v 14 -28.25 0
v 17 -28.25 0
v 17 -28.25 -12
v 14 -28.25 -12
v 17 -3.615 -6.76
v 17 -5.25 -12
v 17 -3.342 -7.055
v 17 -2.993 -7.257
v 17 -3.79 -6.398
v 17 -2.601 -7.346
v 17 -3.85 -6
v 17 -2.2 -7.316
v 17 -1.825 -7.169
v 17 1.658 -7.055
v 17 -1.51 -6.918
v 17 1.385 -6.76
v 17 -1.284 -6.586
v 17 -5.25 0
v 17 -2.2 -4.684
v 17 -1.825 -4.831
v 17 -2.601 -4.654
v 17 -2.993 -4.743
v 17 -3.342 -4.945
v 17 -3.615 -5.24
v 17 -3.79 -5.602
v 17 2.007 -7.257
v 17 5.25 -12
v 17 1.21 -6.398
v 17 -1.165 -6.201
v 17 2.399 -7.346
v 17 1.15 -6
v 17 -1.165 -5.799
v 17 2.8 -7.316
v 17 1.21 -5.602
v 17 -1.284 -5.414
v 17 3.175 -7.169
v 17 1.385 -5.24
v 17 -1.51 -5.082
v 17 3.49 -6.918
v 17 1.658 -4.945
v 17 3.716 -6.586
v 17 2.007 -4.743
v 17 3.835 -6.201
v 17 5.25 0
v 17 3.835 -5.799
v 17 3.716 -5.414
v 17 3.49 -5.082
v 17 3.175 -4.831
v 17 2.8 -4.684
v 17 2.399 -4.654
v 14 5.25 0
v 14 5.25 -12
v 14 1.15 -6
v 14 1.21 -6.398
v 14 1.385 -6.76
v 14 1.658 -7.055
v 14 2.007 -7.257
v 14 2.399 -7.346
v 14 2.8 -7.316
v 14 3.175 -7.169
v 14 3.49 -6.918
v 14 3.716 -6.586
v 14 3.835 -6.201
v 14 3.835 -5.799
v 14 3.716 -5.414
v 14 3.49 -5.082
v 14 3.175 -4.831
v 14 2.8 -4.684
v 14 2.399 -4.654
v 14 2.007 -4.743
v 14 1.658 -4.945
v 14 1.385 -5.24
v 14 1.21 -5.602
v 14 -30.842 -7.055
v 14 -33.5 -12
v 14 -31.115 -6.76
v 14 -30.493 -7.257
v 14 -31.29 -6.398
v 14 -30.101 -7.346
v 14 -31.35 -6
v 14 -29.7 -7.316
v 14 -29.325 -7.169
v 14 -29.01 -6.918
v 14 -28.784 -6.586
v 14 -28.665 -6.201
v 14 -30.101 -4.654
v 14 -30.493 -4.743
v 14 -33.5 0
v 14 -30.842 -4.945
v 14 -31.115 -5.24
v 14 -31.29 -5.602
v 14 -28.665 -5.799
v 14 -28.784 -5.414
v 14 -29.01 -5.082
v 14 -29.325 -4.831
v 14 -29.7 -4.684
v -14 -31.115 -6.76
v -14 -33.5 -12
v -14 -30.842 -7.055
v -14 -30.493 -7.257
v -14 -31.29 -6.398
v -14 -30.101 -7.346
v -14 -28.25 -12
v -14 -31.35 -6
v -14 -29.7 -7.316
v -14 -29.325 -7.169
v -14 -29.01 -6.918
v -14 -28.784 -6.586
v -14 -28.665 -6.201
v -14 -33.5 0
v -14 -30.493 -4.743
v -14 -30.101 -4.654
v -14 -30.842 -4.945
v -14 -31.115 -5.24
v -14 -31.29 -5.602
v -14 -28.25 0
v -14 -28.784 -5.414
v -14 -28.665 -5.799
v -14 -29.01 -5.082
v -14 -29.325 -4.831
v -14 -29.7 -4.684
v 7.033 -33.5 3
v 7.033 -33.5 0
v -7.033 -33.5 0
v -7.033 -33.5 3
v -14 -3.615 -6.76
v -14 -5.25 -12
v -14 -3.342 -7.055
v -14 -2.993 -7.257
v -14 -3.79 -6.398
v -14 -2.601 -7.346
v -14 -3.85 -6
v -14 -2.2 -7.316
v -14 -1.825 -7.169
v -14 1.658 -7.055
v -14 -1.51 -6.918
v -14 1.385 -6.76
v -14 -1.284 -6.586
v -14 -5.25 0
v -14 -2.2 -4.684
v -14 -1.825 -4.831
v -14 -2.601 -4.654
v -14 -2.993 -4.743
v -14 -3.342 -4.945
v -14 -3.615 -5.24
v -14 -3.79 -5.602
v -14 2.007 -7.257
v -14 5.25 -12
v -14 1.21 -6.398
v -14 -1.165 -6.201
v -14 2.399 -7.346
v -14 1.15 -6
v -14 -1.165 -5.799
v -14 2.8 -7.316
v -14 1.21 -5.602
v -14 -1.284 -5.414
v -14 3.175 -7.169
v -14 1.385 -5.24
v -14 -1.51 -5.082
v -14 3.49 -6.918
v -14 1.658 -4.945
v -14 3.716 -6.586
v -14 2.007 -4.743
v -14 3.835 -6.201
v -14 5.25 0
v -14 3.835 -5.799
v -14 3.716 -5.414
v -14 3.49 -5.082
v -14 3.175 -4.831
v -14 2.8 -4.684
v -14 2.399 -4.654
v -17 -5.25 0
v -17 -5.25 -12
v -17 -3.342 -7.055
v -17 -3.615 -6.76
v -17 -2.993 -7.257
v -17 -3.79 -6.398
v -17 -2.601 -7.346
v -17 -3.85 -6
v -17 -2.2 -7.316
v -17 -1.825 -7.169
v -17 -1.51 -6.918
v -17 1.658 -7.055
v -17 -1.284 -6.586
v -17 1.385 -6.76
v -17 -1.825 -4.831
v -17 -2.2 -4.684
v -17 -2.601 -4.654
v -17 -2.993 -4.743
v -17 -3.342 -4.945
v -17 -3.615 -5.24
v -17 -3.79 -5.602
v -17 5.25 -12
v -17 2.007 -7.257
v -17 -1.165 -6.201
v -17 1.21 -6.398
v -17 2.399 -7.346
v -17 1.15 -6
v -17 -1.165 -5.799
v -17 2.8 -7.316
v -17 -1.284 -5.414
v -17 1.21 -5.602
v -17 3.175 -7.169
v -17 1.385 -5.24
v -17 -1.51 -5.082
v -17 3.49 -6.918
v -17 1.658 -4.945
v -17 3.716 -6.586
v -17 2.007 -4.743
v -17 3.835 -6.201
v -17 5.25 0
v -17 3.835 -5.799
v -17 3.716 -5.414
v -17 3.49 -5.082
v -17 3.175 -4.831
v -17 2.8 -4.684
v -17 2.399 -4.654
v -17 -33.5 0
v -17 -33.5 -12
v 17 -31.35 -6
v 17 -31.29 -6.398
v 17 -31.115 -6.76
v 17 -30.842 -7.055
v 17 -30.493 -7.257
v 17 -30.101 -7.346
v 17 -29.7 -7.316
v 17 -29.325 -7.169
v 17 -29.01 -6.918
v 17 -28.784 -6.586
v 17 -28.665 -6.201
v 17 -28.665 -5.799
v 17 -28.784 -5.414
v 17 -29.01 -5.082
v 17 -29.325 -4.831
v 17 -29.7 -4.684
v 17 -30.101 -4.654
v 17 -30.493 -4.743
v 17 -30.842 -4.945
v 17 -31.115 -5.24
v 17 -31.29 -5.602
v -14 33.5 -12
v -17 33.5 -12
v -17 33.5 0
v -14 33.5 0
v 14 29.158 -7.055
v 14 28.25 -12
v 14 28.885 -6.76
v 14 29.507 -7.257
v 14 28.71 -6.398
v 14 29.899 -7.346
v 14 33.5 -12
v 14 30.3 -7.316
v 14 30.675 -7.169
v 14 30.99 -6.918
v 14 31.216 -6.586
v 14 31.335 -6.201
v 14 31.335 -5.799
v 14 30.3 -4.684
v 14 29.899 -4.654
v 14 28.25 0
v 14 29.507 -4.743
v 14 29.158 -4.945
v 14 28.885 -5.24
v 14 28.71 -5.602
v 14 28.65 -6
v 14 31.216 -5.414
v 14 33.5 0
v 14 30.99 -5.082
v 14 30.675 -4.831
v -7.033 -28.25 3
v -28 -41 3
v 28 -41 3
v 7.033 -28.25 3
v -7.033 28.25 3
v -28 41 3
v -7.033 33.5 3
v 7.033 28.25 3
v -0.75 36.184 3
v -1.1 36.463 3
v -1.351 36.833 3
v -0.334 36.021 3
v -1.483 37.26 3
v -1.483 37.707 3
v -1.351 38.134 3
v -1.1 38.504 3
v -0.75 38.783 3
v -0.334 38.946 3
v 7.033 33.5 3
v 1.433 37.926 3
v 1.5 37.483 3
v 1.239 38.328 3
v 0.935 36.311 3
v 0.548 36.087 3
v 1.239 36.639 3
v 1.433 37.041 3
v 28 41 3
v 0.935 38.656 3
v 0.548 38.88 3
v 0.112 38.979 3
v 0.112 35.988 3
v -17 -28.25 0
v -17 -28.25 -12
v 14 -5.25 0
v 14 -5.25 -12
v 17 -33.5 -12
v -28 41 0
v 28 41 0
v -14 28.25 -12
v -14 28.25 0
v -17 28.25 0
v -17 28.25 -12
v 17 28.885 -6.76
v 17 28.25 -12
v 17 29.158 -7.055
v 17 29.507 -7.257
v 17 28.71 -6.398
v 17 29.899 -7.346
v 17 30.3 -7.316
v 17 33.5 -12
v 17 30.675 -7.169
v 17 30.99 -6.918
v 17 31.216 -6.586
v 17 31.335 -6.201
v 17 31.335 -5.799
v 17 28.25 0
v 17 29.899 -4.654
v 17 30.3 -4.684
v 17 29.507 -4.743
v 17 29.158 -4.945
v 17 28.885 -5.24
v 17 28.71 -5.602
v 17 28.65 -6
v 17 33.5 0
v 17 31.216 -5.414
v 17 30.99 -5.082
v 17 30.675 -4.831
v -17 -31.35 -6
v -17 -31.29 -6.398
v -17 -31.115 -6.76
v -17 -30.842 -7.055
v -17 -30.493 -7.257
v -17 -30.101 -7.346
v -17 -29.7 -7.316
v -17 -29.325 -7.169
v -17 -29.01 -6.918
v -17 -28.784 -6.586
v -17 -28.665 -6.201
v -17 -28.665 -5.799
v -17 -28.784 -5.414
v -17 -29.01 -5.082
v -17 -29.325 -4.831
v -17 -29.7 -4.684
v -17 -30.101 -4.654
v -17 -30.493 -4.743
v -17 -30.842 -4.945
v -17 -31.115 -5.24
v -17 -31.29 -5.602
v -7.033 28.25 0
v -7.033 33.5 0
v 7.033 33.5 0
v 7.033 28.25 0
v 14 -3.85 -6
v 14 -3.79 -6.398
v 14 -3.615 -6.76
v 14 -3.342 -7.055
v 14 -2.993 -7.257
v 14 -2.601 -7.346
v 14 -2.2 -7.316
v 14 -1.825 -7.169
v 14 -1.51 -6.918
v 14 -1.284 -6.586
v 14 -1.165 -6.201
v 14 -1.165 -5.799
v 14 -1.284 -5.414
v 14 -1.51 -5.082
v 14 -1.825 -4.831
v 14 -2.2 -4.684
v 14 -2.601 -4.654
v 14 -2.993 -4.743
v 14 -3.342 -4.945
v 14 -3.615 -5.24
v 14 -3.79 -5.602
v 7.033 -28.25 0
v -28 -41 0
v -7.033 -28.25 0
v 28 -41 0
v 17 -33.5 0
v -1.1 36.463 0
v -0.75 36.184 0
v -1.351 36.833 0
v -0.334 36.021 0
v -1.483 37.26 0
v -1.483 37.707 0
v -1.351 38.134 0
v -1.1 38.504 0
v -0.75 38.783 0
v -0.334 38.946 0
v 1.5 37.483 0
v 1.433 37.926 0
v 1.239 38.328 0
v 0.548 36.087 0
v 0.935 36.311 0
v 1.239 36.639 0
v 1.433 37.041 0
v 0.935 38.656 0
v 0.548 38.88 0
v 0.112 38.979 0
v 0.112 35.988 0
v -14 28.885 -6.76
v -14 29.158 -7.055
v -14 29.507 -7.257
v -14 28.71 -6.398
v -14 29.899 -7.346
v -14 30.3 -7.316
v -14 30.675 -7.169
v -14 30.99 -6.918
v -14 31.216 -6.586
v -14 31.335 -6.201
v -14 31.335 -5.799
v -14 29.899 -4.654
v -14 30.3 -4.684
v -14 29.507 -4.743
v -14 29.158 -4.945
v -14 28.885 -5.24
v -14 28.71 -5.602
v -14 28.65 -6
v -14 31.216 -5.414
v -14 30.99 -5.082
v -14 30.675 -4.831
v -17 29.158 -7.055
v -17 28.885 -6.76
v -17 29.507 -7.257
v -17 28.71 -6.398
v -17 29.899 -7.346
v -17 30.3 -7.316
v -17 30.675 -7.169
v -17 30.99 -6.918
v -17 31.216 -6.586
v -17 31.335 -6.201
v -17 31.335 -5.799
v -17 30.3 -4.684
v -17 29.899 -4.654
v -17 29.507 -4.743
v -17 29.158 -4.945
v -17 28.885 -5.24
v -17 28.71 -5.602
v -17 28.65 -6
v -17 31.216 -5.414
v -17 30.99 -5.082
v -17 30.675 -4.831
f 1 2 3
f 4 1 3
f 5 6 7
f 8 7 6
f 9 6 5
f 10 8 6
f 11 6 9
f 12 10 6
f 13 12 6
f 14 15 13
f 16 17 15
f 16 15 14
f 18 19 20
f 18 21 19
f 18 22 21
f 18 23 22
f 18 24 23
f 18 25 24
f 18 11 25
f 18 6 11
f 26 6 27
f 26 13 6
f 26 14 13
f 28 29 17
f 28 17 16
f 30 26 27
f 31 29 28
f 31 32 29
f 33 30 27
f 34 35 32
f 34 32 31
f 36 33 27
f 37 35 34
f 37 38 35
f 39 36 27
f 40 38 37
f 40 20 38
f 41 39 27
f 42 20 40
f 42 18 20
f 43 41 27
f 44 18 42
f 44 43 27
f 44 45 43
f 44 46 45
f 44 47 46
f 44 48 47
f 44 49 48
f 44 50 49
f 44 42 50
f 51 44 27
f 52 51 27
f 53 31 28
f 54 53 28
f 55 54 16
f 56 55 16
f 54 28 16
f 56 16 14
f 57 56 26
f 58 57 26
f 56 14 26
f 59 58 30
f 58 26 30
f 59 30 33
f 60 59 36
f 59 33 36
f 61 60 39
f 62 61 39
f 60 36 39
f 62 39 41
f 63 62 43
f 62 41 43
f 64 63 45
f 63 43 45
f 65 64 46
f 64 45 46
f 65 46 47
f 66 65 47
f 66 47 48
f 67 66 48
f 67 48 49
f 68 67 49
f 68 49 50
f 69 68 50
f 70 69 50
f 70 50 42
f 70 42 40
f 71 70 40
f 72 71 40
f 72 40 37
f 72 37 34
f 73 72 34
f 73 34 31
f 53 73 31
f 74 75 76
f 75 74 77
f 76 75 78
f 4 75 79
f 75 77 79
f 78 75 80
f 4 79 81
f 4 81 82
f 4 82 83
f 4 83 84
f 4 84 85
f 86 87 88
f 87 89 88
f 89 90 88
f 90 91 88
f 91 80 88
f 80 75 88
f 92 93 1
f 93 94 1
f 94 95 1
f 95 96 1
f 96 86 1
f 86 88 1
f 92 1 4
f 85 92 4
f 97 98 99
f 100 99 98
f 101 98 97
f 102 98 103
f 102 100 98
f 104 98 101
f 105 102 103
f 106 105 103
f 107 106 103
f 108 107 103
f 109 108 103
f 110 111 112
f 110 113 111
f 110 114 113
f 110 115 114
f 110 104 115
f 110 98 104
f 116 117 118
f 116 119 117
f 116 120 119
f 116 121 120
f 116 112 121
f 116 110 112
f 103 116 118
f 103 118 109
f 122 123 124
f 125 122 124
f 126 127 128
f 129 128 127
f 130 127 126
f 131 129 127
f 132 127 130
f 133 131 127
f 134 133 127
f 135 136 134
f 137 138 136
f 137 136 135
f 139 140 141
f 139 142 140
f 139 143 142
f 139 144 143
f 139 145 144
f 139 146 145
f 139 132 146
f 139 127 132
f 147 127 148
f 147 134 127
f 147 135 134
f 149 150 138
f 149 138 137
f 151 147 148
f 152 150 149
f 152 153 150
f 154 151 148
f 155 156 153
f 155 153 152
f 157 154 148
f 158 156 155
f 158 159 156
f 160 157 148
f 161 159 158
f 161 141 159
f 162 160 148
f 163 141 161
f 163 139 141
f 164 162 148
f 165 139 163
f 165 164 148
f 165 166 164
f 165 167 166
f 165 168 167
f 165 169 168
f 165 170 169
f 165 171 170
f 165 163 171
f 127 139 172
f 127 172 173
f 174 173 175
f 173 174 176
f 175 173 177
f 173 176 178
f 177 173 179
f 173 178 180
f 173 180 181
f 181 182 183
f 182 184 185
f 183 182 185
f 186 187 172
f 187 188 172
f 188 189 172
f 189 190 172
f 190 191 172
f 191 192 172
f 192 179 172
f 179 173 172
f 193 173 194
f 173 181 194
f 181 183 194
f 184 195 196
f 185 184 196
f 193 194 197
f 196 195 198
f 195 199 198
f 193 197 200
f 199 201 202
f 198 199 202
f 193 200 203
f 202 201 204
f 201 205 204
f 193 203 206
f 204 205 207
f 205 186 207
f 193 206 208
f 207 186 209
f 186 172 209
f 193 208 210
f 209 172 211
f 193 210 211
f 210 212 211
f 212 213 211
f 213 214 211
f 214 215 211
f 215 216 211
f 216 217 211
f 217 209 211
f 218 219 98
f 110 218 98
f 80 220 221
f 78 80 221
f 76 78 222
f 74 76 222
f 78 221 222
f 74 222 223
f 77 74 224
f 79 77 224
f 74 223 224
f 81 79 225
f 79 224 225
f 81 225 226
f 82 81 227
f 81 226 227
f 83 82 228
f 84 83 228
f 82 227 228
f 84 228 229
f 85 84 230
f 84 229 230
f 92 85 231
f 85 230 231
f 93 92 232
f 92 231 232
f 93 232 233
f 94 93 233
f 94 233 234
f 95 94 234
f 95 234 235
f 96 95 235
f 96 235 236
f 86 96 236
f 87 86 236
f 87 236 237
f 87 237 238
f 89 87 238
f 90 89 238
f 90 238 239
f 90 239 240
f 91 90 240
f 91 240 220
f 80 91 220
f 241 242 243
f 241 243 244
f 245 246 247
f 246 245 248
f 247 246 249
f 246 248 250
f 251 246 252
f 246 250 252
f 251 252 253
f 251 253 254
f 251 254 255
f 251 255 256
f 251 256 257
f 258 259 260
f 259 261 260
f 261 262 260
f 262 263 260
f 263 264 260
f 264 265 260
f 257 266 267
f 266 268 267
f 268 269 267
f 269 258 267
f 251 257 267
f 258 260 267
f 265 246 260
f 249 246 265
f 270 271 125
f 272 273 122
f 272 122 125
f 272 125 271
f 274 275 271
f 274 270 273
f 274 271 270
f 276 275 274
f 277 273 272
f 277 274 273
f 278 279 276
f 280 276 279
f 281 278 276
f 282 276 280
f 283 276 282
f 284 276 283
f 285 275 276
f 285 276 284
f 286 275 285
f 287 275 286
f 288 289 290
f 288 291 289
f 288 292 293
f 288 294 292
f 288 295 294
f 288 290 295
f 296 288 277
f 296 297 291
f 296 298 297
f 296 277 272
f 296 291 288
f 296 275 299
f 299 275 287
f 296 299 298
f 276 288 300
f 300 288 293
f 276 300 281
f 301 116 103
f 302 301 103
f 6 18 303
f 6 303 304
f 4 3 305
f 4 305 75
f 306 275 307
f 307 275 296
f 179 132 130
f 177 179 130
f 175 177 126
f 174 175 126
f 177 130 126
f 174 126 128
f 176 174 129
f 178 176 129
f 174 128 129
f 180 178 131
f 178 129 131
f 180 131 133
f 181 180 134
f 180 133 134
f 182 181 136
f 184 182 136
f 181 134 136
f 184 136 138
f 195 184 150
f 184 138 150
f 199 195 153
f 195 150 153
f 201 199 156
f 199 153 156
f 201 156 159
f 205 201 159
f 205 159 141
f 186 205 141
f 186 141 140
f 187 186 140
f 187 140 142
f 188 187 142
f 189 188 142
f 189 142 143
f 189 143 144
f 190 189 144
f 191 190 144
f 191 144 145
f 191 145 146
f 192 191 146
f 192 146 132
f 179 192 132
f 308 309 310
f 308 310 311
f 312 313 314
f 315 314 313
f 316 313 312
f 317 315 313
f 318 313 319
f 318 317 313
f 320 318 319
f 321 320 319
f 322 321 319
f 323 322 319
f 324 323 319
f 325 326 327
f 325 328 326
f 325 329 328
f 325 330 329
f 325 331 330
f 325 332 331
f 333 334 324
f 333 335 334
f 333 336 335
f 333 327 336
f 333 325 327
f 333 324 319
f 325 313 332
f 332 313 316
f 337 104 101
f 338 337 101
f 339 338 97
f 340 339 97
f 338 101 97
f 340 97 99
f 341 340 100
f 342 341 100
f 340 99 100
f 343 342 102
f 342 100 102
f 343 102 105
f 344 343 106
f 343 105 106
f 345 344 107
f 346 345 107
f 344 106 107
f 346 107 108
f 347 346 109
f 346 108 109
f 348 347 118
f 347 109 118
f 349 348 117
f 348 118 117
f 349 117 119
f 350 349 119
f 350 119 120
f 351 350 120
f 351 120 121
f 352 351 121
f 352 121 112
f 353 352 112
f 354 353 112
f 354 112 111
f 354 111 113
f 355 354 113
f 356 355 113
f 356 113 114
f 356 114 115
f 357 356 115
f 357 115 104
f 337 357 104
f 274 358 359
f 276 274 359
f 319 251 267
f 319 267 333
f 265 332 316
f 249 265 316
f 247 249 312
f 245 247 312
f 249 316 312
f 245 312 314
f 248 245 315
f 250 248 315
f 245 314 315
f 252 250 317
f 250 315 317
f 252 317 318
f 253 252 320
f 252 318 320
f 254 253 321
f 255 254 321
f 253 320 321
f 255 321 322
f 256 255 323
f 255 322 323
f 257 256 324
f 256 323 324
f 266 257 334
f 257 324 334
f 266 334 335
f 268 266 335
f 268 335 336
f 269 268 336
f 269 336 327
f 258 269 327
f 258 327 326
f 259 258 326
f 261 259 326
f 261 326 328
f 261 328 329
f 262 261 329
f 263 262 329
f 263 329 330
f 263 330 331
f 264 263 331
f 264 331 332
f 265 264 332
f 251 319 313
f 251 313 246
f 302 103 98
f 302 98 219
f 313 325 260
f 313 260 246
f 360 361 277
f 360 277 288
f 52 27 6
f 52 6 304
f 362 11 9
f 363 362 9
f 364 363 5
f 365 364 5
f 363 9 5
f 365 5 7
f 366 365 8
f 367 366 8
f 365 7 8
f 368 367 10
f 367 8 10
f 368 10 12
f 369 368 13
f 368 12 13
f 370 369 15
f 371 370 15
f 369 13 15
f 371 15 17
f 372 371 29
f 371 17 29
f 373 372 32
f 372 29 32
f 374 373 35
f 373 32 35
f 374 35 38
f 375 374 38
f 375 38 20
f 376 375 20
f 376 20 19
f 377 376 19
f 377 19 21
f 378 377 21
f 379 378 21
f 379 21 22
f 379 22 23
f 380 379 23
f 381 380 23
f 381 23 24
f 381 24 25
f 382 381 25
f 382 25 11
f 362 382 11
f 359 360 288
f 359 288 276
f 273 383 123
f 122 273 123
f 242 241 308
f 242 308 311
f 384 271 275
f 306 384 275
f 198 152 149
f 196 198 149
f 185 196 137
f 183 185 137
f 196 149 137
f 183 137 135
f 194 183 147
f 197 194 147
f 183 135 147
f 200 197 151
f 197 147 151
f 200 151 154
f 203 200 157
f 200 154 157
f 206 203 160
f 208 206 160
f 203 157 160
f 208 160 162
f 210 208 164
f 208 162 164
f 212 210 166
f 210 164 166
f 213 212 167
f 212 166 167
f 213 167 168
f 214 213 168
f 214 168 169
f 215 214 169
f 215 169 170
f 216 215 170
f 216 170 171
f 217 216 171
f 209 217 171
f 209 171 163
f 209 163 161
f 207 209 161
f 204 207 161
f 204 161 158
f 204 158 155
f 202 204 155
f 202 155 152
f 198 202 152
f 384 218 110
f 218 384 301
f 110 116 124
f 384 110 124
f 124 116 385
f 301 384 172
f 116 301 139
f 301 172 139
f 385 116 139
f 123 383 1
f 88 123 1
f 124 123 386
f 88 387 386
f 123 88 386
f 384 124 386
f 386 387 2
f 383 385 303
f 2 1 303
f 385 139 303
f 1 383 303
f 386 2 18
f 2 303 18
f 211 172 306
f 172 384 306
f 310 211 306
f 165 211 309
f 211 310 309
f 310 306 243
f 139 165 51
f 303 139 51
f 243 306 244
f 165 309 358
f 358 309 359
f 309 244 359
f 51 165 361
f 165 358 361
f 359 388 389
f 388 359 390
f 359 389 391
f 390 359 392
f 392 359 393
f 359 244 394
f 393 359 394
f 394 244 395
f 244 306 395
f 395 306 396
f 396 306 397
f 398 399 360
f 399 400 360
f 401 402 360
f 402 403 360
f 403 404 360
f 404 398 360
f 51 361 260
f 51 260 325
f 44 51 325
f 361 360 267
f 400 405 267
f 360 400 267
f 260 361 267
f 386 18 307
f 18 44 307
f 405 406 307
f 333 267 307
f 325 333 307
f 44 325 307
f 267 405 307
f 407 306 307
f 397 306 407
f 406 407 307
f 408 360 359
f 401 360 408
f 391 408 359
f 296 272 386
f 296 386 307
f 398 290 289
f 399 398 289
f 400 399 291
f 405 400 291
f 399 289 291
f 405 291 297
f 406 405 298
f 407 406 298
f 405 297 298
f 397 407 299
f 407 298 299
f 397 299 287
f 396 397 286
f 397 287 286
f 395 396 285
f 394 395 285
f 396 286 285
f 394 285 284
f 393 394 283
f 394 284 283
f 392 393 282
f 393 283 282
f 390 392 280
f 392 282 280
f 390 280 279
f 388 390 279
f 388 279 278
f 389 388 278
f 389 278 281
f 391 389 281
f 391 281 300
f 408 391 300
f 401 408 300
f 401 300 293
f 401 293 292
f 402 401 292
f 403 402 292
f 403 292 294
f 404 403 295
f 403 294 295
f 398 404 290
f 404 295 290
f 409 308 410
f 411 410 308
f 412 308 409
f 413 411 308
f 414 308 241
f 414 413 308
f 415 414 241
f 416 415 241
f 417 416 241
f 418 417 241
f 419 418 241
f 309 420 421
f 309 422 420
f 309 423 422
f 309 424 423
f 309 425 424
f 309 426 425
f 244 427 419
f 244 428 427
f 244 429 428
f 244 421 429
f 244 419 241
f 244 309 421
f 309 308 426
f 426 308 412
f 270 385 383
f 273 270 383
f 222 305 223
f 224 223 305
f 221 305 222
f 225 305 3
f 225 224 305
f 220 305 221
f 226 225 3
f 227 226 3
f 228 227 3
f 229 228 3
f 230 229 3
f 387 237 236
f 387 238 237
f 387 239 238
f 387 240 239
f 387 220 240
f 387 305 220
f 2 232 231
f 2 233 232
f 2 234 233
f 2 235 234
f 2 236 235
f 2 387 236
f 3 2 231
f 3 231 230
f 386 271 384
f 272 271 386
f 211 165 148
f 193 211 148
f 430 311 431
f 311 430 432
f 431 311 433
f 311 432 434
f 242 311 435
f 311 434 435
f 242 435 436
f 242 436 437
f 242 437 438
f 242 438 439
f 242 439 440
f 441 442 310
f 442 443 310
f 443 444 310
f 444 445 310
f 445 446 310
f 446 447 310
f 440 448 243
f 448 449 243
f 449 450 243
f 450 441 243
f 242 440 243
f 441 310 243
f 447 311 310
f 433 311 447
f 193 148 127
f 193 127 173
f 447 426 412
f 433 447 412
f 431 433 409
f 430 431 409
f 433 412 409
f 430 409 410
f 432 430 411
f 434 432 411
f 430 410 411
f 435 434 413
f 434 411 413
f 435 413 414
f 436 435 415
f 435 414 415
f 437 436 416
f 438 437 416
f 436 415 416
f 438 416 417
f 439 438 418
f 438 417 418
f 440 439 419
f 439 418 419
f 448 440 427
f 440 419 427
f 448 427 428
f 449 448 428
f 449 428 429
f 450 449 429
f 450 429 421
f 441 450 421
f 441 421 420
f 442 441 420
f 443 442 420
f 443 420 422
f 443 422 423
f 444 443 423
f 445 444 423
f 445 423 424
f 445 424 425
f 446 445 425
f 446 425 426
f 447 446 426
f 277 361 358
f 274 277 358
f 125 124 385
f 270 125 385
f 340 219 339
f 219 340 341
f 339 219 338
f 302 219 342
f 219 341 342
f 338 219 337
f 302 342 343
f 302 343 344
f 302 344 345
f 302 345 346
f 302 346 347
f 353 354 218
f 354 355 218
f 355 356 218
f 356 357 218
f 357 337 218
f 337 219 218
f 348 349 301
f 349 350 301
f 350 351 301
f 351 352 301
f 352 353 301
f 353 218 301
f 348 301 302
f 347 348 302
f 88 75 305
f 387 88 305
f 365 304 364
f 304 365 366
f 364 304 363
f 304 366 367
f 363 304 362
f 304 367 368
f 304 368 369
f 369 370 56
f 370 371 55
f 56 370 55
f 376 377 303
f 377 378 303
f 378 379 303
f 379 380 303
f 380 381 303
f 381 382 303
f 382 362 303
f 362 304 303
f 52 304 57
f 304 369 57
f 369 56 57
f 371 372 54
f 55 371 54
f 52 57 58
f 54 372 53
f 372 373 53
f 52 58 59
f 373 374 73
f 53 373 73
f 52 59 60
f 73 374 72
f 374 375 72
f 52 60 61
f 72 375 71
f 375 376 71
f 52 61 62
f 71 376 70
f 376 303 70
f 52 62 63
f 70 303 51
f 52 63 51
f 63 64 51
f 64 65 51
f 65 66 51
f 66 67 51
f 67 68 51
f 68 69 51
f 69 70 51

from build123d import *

# Parameters (mm, degrees)
SKETCH_1_W          = 48
SKETCH_1_H          = 67
EXTRUDE_2_DEPTH     = 3
SKETCH_3_W          = 3
SKETCH_3_H          = 67
EXTRUDE_3_DEPTH     = 12
SKETCH_4_R          = 1.35
SKETCH_4_W          = 12
SKETCH_4_H          = 23
CUT_EXTRUDE_1_DEPTH = 65
SKETCH_5_W          = 18.288137738
SKETCH_5_H          = 10.5
CUT_EXTRUDE_2_DEPTH = 65
SKETCH_6_W          = 3.5
SKETCH_6_H          = 67
CUT_EXTRUDE_3_DEPTH = 65
FILLET_1_R          = 3
SKETCH_7_W          = 56
SKETCH_7_H          = 82
EXTRUDE_4_DEPTH     = 3
SKETCH_9_W          = 14.065102052
SKETCH_9_H          = 5.25
CUT_EXTRUDE_4_DEPTH = 3
SKETCH_10_R         = 1.5
CUT_EXTRUDE_5_DEPTH = 3


with BuildPart() as part:
    # 草图1 → 凸台-拉伸2 (new body)
    with BuildSketch(Plane.XY):
        Rectangle(SKETCH_1_W, SKETCH_1_H)
    extrude(amount=EXTRUDE_2_DEPTH)

    # 草图3 → 凸台-拉伸3 (add)
    with BuildSketch(Plane(origin=(0, 0, 0), x_dir=(-1, 0, 0), z_dir=(0, 0, -1))):
        with Locations((-15.5, 0)):
            Rectangle(SKETCH_3_W, SKETCH_3_H)
        with Locations((15.5, 0)):
            Rectangle(SKETCH_3_W, SKETCH_3_H)
    extrude(amount=EXTRUDE_3_DEPTH)

    # 草图4 → 切除-拉伸1 (cut)
    with BuildSketch(Plane(origin=(17, 0, 0), x_dir=(0, 0, -1), z_dir=(1, 0, 0))):
        with Locations(Location((6, 2.5, 0), (0, 0, 270))):
            Circle(SKETCH_4_R)
        with Locations(Location((6, 30, 0), (0, 0, 270))):
            Circle(SKETCH_4_R)
        with Locations(Location((6, -2.5, 0), (0, 0, 270))):
            Circle(SKETCH_4_R)
        with Locations(Location((6, -30, 0), (0, 0, 270))):
            Circle(SKETCH_4_R)
        with Locations((6, -16.75)):
            Rectangle(SKETCH_4_W, SKETCH_4_H)
        with Locations((6, 16.75)):
            Rectangle(SKETCH_4_W, SKETCH_4_H)
    extrude(amount=-CUT_EXTRUDE_1_DEPTH, mode=Mode.SUBTRACT)

    # 草图5 → 切除-拉伸2 (cut)
    with BuildSketch(Plane(origin=(0, 0, 0), x_dir=(-1, 0, 0), z_dir=(0, 0, -1))):
        Rectangle(SKETCH_5_W, SKETCH_5_H)
    extrude(amount=-CUT_EXTRUDE_2_DEPTH, mode=Mode.SUBTRACT)

    # 草图6 → 切除-拉伸3 (cut)
    with BuildSketch(Plane(origin=(0, 0, 0), x_dir=(-1, 0, 0), z_dir=(0, 0, -1))):
        with Locations((22.25, 0)):
            Rectangle(SKETCH_6_W, SKETCH_6_H)
        with Locations((-22.25, 0)):
            Rectangle(SKETCH_6_W, SKETCH_6_H)
    extrude(amount=-CUT_EXTRUDE_3_DEPTH, mode=Mode.SUBTRACT)

    # 圆角1
    fillet_1_edges = [part.edges().sort_by_distance(p)[0] for p in [
        (20.5, 33.5, 1.5),
        (20.5, -33.5, 1.5),
        (-20.5, -33.5, 1.5),
        (-20.5, 33.5, 1.5),
    ]]
    fillet(fillet_1_edges, radius=FILLET_1_R)

    # 草图7 → 凸台-拉伸4 (add)
    with BuildSketch(Plane.XY.offset(3)):
        Rectangle(SKETCH_7_W, SKETCH_7_H)
    extrude(amount=-EXTRUDE_4_DEPTH)

    # 草图9 → 切除-拉伸4 (cut)
    with BuildSketch(Plane(origin=(0, 0, 0), x_dir=(-1, 0, 0), z_dir=(0, 0, -1))):
        with Locations((0, 30.875)):
            Rectangle(SKETCH_9_W, SKETCH_9_H)
        Polygon((0, -28.25), (-7.032551026, -28.25), (-7.032551026, -33.5), (7.032551026, -33.5), (7.032551026, -28.25), align=None)
    extrude(amount=-CUT_EXTRUDE_4_DEPTH, mode=Mode.SUBTRACT)

    # 草图10 → 切除-拉伸5 (cut)
    with BuildSketch(Plane.XY.offset(3)):
        with Locations((0, 37.483485188)):
            Circle(SKETCH_10_R)
    extrude(amount=-CUT_EXTRUDE_5_DEPTH, mode=Mode.SUBTRACT)


solid = part.part
